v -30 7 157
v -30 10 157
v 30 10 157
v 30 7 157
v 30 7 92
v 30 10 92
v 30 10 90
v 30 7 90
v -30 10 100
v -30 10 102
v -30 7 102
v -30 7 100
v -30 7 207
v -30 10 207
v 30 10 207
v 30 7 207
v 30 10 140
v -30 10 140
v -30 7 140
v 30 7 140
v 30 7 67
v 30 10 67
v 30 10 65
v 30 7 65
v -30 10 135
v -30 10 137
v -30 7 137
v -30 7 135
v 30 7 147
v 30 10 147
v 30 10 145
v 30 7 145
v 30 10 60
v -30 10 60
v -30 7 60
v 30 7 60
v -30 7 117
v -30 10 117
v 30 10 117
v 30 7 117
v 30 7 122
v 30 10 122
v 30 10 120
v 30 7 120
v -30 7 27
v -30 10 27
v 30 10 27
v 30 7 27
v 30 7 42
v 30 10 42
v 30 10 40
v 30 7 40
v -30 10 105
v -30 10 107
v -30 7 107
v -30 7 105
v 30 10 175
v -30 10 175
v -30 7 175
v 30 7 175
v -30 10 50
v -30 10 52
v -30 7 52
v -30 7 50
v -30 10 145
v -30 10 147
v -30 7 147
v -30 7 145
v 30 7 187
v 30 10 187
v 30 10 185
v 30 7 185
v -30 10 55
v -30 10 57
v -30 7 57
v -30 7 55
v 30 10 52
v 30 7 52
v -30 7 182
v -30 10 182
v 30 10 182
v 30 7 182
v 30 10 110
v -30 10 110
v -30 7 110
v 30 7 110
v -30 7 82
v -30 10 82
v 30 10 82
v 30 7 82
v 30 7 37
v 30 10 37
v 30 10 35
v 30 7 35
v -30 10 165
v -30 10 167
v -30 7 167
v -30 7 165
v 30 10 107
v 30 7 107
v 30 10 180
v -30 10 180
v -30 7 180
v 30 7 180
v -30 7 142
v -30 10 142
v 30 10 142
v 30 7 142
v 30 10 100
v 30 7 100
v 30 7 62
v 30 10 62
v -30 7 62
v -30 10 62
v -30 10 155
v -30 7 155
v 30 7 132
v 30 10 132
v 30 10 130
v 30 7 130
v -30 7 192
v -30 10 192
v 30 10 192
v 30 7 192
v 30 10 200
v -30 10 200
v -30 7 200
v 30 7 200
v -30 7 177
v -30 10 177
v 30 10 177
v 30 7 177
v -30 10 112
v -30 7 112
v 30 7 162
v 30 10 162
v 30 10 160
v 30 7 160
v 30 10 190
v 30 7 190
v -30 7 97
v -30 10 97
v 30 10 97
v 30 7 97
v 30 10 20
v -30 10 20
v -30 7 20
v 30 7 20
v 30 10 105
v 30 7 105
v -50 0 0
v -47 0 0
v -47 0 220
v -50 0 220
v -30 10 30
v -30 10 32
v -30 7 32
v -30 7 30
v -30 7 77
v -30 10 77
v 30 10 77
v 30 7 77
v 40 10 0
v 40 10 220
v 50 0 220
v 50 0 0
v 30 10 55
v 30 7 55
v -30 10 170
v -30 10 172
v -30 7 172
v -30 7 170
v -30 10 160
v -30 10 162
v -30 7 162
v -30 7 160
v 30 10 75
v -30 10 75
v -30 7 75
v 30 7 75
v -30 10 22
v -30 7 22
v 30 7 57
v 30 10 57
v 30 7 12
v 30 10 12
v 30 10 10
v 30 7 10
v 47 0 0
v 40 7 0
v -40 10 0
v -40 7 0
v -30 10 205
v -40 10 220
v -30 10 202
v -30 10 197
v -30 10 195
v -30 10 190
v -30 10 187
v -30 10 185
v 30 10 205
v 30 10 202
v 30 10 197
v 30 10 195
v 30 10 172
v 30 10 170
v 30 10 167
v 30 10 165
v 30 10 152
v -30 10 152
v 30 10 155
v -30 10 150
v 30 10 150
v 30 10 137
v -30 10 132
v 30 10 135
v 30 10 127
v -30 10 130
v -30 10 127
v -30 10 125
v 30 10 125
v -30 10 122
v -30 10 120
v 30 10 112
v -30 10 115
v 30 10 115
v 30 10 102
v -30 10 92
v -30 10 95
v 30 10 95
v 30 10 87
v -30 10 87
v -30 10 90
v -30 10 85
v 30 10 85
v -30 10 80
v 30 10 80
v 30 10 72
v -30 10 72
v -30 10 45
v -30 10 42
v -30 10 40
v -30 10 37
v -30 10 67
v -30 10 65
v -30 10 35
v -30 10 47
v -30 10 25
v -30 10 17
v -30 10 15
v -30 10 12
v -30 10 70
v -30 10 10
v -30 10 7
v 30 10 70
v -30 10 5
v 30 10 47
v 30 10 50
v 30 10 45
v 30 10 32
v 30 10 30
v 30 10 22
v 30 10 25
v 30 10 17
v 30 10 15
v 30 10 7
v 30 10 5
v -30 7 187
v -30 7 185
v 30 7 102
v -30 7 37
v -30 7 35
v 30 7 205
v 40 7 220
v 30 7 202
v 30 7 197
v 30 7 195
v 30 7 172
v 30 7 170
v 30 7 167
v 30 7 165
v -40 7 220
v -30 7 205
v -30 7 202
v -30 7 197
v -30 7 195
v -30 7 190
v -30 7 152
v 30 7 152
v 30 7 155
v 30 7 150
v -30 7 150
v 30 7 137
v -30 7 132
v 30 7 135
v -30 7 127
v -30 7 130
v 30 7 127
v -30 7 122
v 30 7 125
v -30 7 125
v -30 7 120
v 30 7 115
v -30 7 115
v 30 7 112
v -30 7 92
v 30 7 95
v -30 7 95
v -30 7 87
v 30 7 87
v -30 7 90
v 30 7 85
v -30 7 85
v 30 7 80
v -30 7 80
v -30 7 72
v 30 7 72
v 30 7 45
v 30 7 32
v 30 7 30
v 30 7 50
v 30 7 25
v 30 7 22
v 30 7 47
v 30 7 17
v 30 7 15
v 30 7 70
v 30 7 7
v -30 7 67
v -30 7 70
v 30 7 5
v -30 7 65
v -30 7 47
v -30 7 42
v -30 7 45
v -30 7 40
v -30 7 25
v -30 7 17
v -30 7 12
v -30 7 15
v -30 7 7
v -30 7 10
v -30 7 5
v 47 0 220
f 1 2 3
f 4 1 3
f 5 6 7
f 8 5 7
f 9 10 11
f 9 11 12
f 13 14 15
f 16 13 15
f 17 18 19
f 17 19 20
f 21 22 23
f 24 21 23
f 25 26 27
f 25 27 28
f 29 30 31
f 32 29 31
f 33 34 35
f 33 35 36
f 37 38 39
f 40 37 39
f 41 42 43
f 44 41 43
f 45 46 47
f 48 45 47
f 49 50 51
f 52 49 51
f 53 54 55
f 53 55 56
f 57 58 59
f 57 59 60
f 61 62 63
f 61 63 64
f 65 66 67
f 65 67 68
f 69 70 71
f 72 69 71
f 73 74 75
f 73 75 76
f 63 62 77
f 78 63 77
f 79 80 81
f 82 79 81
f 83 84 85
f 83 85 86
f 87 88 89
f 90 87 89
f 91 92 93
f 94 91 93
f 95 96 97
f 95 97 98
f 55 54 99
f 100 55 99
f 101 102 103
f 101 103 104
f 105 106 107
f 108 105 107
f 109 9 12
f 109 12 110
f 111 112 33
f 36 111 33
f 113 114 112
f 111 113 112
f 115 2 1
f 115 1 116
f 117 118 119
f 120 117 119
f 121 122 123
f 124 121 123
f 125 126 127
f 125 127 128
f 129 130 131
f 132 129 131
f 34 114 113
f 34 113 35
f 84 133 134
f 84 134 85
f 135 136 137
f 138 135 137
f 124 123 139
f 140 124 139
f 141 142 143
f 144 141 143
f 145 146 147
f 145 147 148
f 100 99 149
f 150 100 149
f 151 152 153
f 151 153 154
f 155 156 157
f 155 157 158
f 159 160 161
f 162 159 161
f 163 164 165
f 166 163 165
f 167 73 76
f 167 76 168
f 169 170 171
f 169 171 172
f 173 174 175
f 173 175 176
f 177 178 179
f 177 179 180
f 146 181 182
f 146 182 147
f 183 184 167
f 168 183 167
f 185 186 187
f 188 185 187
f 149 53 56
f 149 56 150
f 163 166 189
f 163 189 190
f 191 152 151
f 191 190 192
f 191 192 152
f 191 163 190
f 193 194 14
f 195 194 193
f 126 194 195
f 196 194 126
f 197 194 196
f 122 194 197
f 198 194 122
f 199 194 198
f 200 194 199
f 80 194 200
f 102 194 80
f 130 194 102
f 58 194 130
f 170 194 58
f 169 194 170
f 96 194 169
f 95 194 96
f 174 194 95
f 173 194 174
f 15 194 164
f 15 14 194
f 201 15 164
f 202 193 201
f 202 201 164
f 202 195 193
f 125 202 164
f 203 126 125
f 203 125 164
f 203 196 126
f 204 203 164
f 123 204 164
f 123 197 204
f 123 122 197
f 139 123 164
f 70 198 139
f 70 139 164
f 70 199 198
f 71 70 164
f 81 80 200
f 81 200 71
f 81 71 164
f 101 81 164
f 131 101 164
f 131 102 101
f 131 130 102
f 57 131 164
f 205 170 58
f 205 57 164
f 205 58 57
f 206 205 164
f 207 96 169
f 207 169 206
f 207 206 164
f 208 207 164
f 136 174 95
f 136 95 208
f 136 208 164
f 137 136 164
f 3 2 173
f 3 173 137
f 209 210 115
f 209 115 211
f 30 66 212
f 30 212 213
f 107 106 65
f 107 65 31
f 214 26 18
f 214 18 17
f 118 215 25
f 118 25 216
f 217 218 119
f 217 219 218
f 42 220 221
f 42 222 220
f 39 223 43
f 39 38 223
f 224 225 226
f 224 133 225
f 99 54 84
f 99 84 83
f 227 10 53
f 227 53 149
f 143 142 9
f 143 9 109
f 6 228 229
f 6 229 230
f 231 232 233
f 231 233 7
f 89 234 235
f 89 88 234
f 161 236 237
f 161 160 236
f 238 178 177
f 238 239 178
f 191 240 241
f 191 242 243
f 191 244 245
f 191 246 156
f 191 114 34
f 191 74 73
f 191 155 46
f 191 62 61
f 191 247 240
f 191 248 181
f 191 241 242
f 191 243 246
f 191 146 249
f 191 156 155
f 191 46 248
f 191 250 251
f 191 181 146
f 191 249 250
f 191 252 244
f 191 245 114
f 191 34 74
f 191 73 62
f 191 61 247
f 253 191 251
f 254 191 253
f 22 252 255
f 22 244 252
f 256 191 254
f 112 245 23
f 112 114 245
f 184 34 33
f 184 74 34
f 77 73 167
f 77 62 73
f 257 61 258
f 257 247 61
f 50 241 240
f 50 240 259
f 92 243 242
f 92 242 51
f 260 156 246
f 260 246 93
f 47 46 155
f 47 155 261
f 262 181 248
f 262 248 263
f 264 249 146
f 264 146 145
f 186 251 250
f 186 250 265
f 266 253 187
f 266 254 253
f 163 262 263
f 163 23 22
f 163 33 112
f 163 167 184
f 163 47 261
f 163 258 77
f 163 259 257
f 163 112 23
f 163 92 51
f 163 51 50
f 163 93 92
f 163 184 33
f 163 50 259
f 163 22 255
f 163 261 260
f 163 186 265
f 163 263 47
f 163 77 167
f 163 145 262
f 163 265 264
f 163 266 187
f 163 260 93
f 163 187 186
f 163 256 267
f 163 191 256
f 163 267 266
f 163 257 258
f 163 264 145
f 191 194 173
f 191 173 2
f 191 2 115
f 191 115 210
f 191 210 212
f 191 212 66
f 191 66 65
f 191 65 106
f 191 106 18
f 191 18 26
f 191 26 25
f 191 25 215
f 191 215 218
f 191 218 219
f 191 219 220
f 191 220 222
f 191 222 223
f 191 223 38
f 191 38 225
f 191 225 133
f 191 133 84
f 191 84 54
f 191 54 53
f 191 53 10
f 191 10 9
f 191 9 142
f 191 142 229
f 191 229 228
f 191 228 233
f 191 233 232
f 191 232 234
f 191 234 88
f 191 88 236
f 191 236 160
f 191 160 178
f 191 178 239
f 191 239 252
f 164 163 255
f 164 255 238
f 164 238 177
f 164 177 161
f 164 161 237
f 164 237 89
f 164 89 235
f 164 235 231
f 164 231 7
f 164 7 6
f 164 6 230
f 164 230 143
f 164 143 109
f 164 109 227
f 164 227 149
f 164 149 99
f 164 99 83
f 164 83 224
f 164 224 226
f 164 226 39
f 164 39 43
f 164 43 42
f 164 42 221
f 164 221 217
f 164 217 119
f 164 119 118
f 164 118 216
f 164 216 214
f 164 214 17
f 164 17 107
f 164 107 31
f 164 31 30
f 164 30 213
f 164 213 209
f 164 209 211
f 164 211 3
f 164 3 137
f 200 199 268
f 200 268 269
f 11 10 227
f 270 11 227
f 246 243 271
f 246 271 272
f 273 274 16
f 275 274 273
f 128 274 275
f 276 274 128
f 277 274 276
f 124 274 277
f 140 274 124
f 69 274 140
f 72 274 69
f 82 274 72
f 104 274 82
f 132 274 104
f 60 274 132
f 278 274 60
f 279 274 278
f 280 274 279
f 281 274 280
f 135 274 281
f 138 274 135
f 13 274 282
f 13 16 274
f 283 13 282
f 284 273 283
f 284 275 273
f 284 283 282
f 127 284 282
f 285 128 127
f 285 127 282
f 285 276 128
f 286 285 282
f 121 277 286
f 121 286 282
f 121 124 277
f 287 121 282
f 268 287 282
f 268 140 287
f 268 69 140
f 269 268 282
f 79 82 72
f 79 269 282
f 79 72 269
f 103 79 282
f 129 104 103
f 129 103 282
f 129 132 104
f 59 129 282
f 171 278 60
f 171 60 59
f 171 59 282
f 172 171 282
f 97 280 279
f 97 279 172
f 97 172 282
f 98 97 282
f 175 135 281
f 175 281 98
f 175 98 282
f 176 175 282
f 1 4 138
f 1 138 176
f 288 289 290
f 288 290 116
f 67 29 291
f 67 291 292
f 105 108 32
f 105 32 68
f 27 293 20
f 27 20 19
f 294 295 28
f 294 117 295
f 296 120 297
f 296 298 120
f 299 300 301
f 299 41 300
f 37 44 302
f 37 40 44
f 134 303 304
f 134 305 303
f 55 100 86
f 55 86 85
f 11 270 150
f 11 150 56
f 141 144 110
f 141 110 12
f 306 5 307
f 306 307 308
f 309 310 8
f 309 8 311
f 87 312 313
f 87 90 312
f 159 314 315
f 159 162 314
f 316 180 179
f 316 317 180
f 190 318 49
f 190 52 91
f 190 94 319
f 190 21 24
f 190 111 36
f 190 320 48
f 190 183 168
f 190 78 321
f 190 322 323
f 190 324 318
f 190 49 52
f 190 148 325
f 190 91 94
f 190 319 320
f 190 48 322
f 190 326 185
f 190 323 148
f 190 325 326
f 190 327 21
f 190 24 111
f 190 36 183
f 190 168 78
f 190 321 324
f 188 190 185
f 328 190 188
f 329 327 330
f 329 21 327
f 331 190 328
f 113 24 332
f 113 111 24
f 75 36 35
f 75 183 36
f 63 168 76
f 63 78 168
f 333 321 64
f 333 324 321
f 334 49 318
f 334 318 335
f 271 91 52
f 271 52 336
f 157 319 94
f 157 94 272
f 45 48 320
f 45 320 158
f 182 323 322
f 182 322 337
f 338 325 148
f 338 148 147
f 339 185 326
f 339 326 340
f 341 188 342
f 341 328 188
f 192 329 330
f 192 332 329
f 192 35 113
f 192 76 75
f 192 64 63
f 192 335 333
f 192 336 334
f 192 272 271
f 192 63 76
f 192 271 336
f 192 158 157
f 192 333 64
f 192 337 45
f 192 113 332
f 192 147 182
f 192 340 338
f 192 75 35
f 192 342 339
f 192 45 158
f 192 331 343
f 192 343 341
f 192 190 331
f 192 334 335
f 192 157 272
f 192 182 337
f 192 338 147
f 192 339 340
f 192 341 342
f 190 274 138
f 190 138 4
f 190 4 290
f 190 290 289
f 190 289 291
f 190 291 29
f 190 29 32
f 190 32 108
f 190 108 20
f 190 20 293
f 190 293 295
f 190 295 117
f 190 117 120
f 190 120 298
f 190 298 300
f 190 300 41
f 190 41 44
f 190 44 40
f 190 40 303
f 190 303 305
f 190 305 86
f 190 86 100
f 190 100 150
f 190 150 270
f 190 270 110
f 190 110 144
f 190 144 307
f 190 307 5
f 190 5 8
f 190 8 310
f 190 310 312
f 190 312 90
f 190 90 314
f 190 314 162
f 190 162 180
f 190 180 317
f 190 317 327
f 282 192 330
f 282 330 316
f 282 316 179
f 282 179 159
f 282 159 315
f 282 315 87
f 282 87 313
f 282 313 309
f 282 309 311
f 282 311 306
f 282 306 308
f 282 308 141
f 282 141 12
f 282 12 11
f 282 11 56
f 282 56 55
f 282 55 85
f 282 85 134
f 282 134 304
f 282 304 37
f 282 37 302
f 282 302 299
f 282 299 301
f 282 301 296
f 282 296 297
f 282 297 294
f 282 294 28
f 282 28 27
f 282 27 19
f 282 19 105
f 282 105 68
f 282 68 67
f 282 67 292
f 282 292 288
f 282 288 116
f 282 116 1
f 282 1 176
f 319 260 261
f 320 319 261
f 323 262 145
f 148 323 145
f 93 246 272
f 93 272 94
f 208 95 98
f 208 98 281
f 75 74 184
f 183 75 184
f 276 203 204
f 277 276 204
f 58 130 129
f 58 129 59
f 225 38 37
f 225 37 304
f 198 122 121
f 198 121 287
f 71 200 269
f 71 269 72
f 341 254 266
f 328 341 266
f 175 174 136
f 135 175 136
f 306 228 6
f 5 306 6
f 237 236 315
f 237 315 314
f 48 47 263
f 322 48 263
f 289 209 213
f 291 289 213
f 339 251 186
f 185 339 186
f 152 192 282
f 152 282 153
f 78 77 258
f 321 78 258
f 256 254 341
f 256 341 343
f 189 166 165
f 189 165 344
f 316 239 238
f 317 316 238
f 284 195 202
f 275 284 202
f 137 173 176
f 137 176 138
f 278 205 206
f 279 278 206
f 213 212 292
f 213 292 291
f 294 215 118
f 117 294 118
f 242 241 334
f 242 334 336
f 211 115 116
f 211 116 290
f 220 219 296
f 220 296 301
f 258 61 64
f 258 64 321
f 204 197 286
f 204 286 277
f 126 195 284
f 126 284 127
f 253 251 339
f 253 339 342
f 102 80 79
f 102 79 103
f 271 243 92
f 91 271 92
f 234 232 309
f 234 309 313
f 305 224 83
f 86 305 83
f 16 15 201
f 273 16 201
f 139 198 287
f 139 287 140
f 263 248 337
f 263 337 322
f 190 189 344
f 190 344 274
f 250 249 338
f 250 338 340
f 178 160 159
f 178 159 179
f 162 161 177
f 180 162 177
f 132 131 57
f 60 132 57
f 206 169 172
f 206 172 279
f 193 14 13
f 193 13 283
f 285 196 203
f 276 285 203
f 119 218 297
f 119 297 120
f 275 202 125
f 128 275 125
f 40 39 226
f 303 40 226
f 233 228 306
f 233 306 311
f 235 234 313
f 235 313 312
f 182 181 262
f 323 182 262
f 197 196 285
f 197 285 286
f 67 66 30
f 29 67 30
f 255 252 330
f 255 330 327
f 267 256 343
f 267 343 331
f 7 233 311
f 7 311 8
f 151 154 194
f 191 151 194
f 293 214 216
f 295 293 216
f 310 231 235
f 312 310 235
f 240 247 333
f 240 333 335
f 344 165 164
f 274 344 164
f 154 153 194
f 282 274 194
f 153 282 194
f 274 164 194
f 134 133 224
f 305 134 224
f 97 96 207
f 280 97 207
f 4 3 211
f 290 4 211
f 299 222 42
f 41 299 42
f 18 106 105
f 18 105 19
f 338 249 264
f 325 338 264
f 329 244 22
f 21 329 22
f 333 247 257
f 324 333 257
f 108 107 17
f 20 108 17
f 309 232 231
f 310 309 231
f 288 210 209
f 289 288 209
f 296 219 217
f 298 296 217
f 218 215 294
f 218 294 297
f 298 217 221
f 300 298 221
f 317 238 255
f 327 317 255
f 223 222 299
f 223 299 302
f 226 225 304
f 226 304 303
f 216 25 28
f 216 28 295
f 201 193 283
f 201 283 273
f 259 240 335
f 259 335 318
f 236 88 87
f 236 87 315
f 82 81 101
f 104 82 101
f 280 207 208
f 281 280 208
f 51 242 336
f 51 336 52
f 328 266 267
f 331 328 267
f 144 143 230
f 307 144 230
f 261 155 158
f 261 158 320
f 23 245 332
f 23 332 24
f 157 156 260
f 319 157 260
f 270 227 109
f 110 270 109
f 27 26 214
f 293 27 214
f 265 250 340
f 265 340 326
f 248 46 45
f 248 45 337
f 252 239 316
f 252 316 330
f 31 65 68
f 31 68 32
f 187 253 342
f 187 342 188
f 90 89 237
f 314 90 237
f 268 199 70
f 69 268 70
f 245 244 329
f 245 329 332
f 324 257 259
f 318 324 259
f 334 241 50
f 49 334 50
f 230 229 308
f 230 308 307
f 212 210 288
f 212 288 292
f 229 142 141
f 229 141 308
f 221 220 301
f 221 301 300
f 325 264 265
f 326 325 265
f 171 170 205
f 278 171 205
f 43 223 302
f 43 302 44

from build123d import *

# Parameters (mm, degrees)
SALIENTE_EXTRUIR1_DEPTH = 220
CROQUIS2_W              = 60
CROQUIS2_H              = 2
CORTAR_EXTRUIR1_DEPTH   = 10


with BuildPart() as part:
    # Croquis1 → Saliente-Extruir1 (new body)
    with BuildSketch(Plane.XY):
        Polygon((-47, 0), (-50, 0), (-40, 10), (40, 10), (50, 0), (47, 0), (40, 7), (-40, 7), align=None)
    extrude(amount=SALIENTE_EXTRUIR1_DEPTH)

    # Croquis2 → Cortar-Extruir1 (cut)
    with BuildSketch(Plane(origin=(0, 10, 0), x_dir=(1, 0, 0), z_dir=(0, 1, 0))):
        with Locations((0, -6)):
            Rectangle(CROQUIS2_W, CROQUIS2_H)
        with Locations((0, -11)):
            Rectangle(CROQUIS2_W, CROQUIS2_H)
        with Locations((0, -16)):
            Rectangle(CROQUIS2_W, CROQUIS2_H)
        with Locations((0, -21)):
            Rectangle(CROQUIS2_W, CROQUIS2_H)
        with Locations((0, -26)):
            Rectangle(CROQUIS2_W, CROQUIS2_H)
        with Locations((0, -31)):
            Rectangle(CROQUIS2_W, CROQUIS2_H)
        with Locations((0, -36)):
            Rectangle(CROQUIS2_W, CROQUIS2_H)
        with Locations((0, -41)):
            Rectangle(CROQUIS2_W, CROQUIS2_H)
        with Locations((0, -46)):
            Rectangle(CROQUIS2_W, CROQUIS2_H)
        with Locations((0, -51)):
            Rectangle(CROQUIS2_W, CROQUIS2_H)
        with Locations((0, -56)):
            Rectangle(CROQUIS2_W, CROQUIS2_H)
        with Locations((0, -61)):
            Rectangle(CROQUIS2_W, CROQUIS2_H)
        with Locations((0, -66)):
            Rectangle(CROQUIS2_W, CROQUIS2_H)
        with Locations((0, -71)):
            Rectangle(CROQUIS2_W, CROQUIS2_H)
        with Locations((0, -76)):
            Rectangle(CROQUIS2_W, CROQUIS2_H)
        with Locations((0, -81)):
            Rectangle(CROQUIS2_W, CROQUIS2_H)
        with Locations((0, -86)):
            Rectangle(CROQUIS2_W, CROQUIS2_H)
        with Locations((0, -91)):
            Rectangle(CROQUIS2_W, CROQUIS2_H)
        with Locations((0, -96)):
            Rectangle(CROQUIS2_W, CROQUIS2_H)
        with Locations((0, -101)):
            Rectangle(CROQUIS2_W, CROQUIS2_H)
        with Locations((0, -106)):
            Rectangle(CROQUIS2_W, CROQUIS2_H)
        with Locations((0, -111)):
            Rectangle(CROQUIS2_W, CROQUIS2_H)
        with Locations((0, -116)):
            Rectangle(CROQUIS2_W, CROQUIS2_H)
        with Locations((0, -121)):
            Rectangle(CROQUIS2_W, CROQUIS2_H)
        with Locations((0, -126)):
            Rectangle(CROQUIS2_W, CROQUIS2_H)
        with Locations((0, -131)):
            Rectangle(CROQUIS2_W, CROQUIS2_H)
        with Locations((0, -136)):
            Rectangle(CROQUIS2_W, CROQUIS2_H)
        with Locations((0, -141)):
            Rectangle(CROQUIS2_W, CROQUIS2_H)
        with Locations((0, -146)):
            Rectangle(CROQUIS2_W, CROQUIS2_H)
        with Locations((0, -151)):
            Rectangle(CROQUIS2_W, CROQUIS2_H)
        with Locations((0, -156)):
            Rectangle(CROQUIS2_W, CROQUIS2_H)
        with Locations((0, -161)):
            Rectangle(CROQUIS2_W, CROQUIS2_H)
        with Locations((0, -166)):
            Rectangle(CROQUIS2_W, CROQUIS2_H)
        with Locations((0, -171)):
            Rectangle(CROQUIS2_W, CROQUIS2_H)
        with Locations((0, -176)):
            Rectangle(CROQUIS2_W, CROQUIS2_H)
        with Locations((0, -181)):
            Rectangle(CROQUIS2_W, CROQUIS2_H)
        with Locations((0, -186)):
            Rectangle(CROQUIS2_W, CROQUIS2_H)
        with Locations((0, -191)):
            Rectangle(CROQUIS2_W, CROQUIS2_H)
        with Locations((0, -196)):
            Rectangle(CROQUIS2_W, CROQUIS2_H)
        with Locations((0, -201)):
            Rectangle(CROQUIS2_W, CROQUIS2_H)
        with Locations((0, -206)):
            Rectangle(CROQUIS2_W, CROQUIS2_H)
    extrude(amount=-CORTAR_EXTRUIR1_DEPTH, mode=Mode.SUBTRACT)


solid = part.part
